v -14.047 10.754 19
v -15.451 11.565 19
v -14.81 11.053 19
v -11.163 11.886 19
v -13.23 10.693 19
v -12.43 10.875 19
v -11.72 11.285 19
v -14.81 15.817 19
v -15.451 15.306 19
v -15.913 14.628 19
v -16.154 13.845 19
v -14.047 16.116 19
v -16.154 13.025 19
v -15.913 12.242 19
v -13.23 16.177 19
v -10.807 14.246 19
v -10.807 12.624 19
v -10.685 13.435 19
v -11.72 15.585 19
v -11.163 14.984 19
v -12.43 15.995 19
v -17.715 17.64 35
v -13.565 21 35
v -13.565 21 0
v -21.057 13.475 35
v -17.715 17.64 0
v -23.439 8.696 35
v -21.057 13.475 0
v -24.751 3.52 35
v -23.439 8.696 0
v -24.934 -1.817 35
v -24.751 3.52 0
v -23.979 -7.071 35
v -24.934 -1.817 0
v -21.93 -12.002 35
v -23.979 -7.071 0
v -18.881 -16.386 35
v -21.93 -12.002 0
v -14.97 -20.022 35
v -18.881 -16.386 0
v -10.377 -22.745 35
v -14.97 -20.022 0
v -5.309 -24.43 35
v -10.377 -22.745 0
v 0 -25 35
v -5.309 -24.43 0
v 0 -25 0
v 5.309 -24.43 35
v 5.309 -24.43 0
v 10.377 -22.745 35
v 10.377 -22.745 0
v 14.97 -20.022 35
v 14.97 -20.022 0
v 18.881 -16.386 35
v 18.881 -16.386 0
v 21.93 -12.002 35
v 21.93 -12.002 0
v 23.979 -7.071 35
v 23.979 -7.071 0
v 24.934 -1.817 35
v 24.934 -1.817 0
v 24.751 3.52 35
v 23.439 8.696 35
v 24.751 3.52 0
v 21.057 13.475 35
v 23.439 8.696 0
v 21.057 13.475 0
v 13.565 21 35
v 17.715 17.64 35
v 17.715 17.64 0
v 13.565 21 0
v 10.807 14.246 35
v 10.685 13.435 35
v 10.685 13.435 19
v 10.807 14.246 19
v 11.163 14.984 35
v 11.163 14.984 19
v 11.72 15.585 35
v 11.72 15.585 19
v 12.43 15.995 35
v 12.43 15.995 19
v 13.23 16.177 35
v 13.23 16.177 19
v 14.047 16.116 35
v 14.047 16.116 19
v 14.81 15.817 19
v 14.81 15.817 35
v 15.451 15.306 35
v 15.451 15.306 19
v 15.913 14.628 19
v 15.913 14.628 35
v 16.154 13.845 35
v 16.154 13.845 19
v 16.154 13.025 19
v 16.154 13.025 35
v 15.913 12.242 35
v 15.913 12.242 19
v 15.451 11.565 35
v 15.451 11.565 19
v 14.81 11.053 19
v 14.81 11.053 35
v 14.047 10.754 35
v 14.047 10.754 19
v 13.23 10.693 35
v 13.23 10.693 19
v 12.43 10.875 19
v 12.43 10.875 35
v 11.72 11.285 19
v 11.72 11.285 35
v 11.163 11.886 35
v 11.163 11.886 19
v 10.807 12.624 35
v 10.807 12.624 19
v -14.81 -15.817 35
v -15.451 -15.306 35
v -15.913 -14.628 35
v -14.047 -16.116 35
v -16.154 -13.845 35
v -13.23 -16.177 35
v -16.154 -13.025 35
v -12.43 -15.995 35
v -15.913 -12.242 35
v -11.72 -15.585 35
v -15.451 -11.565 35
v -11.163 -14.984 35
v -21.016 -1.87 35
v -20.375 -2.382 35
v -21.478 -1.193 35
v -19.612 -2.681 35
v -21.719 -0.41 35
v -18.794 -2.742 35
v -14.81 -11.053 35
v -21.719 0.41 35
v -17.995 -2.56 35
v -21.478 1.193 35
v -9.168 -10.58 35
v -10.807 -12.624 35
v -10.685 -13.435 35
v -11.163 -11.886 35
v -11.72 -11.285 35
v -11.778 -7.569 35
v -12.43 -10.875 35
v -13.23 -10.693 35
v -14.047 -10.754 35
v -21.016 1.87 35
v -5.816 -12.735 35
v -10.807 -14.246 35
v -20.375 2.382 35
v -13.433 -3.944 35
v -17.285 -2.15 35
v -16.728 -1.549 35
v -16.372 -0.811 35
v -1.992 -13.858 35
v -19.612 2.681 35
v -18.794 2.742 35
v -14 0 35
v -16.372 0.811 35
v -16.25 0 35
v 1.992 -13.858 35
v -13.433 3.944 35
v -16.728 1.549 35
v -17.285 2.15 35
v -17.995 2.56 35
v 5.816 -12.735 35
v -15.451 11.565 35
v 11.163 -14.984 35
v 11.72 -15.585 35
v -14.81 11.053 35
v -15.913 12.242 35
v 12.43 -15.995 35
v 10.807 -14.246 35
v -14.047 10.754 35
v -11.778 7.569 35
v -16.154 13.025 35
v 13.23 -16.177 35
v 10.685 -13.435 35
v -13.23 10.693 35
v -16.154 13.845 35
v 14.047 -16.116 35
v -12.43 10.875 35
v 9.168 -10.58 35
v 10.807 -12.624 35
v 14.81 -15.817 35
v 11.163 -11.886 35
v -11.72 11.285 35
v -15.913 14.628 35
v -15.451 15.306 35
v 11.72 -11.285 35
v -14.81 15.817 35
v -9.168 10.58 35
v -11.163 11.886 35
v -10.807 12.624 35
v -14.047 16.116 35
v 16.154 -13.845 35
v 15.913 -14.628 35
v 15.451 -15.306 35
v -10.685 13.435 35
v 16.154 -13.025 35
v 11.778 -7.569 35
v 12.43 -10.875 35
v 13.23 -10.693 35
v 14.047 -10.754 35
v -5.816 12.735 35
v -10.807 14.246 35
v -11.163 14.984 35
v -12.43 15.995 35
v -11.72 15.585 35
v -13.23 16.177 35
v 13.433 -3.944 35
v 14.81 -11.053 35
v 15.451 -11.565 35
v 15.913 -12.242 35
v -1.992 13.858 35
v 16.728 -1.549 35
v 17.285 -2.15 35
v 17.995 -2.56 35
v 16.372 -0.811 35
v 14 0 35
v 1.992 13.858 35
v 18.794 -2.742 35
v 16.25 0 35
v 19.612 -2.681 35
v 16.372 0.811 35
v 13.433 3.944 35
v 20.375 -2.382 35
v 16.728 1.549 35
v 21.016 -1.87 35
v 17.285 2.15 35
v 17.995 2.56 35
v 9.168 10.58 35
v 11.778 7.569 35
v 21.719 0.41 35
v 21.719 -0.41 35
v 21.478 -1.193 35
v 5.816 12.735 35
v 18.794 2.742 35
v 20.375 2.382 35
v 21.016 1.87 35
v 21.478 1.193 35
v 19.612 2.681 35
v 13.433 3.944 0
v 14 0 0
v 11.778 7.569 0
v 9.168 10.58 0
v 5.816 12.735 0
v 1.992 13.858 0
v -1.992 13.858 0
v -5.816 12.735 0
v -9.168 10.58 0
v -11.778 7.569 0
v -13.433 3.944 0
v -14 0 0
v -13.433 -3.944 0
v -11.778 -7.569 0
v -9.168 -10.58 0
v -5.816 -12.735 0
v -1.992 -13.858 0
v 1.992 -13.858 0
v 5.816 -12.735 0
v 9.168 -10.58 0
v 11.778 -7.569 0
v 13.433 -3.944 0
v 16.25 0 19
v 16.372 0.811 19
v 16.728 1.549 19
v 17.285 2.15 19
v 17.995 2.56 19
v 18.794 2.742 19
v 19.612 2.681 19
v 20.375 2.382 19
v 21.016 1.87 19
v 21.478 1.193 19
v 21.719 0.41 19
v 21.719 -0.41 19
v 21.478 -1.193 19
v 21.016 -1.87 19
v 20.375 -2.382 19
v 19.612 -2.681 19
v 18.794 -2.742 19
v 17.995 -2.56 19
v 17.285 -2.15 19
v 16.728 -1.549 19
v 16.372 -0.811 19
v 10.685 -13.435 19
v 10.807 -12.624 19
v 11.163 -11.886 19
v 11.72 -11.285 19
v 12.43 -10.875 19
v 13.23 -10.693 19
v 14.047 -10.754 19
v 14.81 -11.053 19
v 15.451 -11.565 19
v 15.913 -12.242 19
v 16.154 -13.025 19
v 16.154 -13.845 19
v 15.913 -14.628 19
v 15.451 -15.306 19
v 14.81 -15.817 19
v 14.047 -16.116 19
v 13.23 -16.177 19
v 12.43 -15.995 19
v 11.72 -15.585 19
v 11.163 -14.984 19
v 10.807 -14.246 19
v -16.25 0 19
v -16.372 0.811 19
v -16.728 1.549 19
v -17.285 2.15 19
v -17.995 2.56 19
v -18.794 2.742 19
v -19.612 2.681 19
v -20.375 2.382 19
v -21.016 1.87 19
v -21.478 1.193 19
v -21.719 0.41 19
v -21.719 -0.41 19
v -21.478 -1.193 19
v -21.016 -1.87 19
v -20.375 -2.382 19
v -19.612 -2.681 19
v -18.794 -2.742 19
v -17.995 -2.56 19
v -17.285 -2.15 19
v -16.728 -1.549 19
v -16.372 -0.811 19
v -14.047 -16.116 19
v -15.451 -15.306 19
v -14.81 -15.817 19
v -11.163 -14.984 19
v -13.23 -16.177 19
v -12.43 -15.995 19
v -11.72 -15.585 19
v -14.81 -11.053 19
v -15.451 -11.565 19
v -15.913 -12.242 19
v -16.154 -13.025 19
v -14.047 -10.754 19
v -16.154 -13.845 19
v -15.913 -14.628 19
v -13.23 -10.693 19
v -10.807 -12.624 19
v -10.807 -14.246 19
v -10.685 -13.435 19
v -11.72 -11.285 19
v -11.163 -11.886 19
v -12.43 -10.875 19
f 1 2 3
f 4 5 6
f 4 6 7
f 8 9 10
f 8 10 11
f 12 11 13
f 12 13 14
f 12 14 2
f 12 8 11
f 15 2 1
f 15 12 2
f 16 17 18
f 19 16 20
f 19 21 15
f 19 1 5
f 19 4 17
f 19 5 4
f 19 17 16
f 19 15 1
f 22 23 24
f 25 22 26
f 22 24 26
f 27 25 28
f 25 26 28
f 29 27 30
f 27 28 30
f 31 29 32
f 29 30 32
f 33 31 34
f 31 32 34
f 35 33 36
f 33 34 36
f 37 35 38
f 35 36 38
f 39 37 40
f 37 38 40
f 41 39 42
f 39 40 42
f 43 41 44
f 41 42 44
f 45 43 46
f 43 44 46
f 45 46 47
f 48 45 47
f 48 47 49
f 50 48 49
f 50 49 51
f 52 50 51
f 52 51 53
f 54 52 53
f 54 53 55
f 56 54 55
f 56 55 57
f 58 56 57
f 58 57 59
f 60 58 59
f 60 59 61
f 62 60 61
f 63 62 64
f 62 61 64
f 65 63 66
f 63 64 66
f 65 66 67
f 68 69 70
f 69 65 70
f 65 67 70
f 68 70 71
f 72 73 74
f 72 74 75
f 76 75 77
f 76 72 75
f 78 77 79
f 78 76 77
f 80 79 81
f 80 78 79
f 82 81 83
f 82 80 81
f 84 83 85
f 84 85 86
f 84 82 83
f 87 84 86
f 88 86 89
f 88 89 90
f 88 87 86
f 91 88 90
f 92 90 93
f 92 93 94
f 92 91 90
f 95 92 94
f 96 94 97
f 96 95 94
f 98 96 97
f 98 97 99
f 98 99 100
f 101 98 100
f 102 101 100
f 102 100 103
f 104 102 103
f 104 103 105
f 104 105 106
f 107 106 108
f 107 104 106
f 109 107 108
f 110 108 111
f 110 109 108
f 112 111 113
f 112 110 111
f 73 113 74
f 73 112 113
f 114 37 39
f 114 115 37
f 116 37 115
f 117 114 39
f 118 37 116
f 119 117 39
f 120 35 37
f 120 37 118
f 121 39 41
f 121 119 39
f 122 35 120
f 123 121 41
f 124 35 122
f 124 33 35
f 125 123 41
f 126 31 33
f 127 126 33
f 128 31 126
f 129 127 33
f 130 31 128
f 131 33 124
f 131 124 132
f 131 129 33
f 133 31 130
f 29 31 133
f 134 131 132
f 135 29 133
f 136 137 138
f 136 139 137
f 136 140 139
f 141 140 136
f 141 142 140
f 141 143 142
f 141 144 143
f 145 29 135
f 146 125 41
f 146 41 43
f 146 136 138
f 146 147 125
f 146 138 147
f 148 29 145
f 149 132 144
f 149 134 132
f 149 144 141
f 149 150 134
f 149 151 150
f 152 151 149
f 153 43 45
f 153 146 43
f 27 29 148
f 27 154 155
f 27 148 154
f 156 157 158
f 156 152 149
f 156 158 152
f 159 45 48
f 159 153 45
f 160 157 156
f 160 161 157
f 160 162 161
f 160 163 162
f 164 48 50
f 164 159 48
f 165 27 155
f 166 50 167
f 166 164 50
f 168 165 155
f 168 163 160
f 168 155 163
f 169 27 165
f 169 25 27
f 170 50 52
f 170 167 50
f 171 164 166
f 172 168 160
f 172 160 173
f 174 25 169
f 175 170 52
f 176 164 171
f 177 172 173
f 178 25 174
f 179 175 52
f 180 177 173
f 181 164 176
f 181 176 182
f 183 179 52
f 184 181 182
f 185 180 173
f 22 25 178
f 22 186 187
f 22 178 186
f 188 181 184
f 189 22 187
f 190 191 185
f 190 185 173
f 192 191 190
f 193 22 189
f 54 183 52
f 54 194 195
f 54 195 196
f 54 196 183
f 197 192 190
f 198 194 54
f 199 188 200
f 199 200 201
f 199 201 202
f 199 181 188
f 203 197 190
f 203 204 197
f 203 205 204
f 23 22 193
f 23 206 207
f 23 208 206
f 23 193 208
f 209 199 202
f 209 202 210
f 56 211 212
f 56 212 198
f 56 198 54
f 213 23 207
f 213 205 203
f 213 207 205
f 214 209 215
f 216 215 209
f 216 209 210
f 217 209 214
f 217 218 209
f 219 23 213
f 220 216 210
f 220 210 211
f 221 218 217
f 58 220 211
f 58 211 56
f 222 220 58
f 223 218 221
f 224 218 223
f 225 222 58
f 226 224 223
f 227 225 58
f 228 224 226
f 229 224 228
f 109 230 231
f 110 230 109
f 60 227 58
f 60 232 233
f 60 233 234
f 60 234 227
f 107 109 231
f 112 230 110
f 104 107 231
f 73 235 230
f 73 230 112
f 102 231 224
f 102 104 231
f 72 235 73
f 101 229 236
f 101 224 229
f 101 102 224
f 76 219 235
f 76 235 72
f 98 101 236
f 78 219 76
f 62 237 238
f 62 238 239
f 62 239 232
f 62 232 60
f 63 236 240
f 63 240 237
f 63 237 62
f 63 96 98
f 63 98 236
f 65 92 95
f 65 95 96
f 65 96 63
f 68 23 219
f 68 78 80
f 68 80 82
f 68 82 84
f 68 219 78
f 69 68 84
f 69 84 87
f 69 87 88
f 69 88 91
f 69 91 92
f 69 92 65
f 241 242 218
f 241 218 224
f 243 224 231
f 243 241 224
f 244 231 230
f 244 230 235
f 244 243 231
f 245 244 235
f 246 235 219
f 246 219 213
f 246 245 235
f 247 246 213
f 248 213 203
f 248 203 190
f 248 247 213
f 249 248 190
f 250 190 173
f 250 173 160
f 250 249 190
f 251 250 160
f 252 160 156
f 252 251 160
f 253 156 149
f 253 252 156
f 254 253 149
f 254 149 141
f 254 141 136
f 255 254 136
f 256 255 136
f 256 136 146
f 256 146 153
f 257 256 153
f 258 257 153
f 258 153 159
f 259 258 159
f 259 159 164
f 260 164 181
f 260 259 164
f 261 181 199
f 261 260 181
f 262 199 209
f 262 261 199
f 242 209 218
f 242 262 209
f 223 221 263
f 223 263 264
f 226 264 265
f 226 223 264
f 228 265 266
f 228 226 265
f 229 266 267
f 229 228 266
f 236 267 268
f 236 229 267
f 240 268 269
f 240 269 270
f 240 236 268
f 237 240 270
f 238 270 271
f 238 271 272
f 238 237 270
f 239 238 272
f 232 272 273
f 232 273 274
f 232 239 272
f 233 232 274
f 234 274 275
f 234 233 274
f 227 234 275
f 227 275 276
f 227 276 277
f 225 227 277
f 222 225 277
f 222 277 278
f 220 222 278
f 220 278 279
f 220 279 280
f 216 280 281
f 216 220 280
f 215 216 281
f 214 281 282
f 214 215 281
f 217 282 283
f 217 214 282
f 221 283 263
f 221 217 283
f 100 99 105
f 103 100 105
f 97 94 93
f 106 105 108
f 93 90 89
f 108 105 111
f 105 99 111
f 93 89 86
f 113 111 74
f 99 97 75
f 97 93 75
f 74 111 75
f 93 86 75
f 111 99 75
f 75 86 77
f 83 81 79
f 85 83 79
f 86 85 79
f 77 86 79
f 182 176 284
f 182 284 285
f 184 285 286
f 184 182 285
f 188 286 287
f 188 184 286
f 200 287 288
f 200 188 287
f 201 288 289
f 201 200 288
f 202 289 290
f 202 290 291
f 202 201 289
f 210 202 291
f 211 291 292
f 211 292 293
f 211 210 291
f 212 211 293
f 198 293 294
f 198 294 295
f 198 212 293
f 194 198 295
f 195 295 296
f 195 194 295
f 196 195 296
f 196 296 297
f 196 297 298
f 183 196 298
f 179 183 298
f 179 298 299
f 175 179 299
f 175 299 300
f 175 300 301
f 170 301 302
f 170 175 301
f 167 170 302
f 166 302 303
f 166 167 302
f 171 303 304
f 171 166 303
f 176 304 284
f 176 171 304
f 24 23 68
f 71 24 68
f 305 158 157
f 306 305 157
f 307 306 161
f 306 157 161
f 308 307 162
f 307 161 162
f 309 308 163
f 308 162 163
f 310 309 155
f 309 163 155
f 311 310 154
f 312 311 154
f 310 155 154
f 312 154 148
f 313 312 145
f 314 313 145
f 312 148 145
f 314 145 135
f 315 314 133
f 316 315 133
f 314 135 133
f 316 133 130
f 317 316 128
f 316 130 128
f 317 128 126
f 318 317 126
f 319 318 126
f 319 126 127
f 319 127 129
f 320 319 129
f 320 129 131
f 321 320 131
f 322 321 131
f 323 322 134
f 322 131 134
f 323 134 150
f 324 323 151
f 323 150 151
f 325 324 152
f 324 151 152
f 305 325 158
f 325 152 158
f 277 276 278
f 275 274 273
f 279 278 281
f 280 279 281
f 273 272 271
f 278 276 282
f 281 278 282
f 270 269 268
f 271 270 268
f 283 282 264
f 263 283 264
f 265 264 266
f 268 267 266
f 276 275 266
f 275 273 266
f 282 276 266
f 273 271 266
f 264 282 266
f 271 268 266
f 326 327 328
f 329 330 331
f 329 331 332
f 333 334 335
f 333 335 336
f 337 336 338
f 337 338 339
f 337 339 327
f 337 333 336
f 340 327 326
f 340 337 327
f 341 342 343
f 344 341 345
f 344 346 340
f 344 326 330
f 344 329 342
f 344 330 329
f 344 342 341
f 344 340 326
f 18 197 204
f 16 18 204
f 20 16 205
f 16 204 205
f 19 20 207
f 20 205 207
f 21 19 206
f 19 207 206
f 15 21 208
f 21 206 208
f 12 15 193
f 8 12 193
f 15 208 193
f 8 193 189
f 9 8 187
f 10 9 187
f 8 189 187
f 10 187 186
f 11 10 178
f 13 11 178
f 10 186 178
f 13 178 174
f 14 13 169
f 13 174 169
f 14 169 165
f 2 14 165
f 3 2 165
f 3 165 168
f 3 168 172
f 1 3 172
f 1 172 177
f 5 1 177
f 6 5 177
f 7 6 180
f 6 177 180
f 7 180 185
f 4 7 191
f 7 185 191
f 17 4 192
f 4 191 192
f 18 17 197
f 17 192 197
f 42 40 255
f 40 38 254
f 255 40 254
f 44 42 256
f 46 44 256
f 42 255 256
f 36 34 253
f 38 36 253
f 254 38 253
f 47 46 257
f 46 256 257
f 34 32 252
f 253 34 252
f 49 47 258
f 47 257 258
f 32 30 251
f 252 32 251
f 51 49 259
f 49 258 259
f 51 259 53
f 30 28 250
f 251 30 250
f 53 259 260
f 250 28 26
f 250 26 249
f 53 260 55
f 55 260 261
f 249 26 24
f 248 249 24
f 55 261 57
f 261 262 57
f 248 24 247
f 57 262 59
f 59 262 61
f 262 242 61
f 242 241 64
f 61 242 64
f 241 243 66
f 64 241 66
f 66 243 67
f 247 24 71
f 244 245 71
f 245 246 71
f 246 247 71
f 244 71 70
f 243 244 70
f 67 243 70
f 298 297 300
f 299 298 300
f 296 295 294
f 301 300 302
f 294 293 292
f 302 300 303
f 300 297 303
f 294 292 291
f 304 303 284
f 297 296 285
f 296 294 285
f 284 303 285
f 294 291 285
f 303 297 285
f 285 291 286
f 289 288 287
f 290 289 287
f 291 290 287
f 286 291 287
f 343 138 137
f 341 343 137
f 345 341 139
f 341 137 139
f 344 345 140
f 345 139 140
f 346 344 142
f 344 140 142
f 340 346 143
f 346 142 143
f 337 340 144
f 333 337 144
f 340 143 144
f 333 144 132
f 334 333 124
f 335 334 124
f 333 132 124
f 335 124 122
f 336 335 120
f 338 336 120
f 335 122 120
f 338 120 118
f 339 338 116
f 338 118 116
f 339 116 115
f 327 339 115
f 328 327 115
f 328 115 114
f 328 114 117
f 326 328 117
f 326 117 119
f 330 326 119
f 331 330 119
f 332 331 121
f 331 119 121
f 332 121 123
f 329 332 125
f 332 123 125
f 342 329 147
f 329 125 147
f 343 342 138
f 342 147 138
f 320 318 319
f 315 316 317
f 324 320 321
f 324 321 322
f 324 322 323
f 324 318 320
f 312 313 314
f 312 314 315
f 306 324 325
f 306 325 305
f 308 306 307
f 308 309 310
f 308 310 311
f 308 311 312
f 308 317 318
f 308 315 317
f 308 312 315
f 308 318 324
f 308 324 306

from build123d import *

# Parameters (mm, degrees)
SKETCH1_R           = 25
SKETCH1_R_2         = 14
BOSS_EXTRUDE1_DEPTH = 35
CUT_EXTRUDE1_REACH  = 37
SKETCH2_W           = 99.603023316
SKETCH2_H           = 15.412230785
SKETCH3_R           = 2.75
CUT_EXTRUDE2_DEPTH  = 16


with BuildPart() as part:
    # Sketch1 → Boss-Extrude1 (new body)
    with BuildSketch(Plane.XY):
        Circle(SKETCH1_R)
        Circle(SKETCH1_R_2, mode=Mode.SUBTRACT)
    extrude(amount=BOSS_EXTRUDE1_DEPTH)

    # Sketch2 → Cut-Extrude1 (cut, up to next)
    with BuildSketch(Plane.XY.offset(35), mode=Mode.PRIVATE) as cut_extrude1_sk1:
        with Locations((-3.888962486, 28.706115393)):
            Rectangle(SKETCH2_W, SKETCH2_H)
    cut_extrude1_tool1 = extrude(cut_extrude1_sk1.sketch, amount=-CUT_EXTRUDE1_REACH, mode=Mode.PRIVATE) & part.part
    add(cut_extrude1_tool1.solids().sort_by_distance((-3.888962, 28.706115, 35))[0], mode=Mode.SUBTRACT)

    # Sketch3 → Cut-Extrude2 (cut)
    with BuildSketch(Plane.XY.offset(35)):
        with Locations((-13.435028843, 13.435028843)):
            Circle(SKETCH3_R)
        with Locations((-19, 0)):
            Circle(SKETCH3_R)
        with Locations((-13.435028843, -13.435028843)):
            Circle(SKETCH3_R)
    cut_extrude2 = extrude(amount=-CUT_EXTRUDE2_DEPTH, mode=Mode.SUBTRACT)

    # Mirror1: Cut-Extrude2 across plane
    add(cut_extrude2.mirror(Plane(origin=(0, 0, 0), x_dir=(0, 0, 1), z_dir=(1, 0, 0))), mode=Mode.SUBTRACT)


solid = part.part
